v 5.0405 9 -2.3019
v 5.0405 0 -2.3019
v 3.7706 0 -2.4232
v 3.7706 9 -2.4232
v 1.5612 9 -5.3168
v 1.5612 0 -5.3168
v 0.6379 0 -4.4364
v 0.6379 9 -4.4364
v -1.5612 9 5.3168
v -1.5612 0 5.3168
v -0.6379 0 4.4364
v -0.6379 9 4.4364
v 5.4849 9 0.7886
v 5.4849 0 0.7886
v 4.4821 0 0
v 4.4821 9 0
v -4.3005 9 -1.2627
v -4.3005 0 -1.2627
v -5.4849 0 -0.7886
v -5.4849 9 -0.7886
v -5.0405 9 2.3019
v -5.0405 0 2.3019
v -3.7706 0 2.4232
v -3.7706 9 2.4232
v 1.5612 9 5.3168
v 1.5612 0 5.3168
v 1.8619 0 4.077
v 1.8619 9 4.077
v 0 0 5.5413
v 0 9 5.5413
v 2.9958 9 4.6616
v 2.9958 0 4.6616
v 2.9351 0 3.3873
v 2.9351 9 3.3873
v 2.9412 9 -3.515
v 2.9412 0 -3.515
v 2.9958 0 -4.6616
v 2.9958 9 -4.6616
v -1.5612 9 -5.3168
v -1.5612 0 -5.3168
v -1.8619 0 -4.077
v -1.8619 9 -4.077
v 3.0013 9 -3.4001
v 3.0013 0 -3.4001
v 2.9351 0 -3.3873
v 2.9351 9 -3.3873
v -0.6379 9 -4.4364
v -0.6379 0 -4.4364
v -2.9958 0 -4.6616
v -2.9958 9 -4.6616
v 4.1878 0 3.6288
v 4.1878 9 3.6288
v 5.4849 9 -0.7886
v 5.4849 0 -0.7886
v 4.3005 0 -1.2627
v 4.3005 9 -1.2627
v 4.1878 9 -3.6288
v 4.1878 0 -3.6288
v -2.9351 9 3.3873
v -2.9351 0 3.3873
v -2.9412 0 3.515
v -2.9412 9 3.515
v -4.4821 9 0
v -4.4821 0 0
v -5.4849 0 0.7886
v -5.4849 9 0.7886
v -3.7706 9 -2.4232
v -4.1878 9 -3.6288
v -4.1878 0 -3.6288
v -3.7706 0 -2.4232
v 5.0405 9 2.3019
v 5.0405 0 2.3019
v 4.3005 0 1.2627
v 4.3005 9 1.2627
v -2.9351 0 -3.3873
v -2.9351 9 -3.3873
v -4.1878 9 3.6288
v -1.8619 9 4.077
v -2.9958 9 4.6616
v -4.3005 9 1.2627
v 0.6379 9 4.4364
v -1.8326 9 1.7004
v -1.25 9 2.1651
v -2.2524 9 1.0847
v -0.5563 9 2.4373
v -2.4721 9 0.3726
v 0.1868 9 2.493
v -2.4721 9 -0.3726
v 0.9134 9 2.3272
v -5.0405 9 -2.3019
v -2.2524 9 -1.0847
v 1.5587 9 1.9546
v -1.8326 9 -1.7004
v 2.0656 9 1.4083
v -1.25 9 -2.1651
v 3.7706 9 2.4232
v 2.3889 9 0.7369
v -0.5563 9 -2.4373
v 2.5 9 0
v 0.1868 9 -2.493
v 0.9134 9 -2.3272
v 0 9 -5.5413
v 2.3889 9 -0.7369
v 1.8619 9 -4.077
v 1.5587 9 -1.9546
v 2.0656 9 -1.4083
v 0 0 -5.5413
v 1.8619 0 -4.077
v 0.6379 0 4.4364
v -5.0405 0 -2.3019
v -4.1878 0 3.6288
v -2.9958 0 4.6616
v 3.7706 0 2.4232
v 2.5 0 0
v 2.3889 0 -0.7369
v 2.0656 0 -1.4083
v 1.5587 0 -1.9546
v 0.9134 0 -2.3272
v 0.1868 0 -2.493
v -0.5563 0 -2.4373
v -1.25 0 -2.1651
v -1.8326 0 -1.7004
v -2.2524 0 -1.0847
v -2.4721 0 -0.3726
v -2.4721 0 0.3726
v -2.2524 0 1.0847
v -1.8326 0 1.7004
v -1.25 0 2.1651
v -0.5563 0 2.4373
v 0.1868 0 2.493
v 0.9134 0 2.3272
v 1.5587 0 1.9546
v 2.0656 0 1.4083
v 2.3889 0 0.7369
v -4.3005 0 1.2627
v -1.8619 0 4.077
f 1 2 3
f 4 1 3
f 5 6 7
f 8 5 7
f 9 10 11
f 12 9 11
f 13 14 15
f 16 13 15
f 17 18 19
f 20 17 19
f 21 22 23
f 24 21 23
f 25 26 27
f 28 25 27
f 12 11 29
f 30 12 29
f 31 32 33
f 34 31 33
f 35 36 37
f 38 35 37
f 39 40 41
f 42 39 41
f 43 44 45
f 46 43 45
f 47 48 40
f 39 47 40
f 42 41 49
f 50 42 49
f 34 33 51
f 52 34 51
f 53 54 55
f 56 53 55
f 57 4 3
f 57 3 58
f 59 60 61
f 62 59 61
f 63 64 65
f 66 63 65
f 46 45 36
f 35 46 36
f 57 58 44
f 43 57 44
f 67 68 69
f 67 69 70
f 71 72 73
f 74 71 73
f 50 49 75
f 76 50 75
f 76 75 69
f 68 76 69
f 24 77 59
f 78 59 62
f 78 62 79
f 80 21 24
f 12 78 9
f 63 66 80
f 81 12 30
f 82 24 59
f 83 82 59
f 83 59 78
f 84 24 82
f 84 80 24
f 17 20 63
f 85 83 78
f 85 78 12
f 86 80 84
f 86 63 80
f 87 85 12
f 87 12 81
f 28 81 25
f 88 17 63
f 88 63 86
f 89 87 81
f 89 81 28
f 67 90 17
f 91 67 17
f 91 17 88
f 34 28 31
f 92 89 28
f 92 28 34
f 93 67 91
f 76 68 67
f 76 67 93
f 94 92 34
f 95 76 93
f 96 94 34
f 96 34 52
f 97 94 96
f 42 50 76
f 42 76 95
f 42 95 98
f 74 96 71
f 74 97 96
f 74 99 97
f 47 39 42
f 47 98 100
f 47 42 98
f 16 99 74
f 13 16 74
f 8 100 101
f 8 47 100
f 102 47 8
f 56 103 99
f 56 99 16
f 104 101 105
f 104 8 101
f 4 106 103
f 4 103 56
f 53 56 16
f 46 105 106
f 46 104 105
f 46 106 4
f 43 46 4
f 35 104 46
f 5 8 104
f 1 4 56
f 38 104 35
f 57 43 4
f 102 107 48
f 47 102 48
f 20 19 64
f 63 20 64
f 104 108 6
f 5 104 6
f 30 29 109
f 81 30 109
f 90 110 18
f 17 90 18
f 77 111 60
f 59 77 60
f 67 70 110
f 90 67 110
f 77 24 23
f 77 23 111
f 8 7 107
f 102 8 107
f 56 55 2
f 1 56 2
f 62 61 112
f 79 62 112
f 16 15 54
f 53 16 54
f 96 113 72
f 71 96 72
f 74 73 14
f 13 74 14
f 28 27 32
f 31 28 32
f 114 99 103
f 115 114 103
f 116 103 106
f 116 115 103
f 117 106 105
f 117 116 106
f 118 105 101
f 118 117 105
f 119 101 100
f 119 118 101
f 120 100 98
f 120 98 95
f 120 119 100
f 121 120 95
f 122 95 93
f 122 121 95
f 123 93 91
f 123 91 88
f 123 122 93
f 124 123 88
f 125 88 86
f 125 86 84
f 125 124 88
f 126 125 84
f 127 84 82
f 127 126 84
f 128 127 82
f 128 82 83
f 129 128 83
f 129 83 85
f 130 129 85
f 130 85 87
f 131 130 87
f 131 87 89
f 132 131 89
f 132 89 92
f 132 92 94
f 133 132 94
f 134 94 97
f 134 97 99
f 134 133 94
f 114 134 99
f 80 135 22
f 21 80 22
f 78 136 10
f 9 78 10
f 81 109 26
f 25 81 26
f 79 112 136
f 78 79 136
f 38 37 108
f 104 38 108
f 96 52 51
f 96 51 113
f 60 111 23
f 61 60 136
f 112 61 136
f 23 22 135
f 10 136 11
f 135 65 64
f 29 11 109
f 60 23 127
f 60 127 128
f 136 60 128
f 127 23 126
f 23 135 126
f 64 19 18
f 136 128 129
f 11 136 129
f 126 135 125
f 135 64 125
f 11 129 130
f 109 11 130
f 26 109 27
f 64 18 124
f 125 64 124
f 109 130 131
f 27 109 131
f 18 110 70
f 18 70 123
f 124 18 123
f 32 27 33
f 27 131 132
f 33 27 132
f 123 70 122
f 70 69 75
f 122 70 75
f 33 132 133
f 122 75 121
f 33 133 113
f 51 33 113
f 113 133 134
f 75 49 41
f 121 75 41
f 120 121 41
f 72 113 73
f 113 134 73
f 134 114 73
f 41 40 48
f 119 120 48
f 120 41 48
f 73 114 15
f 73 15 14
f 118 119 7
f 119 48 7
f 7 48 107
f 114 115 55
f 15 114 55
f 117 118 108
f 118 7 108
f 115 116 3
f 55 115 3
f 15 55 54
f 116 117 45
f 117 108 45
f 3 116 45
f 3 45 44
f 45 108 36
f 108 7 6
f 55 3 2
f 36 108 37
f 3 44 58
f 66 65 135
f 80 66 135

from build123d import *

# Parameters (mm, degrees)
SKETCH1_R           = 2.5
BOSS_EXTRUDE1_DEPTH = 9


with BuildPart() as part:
    # Sketch1 → Boss-Extrude1 (new body)
    with BuildSketch(Plane(origin=(0, 0, 0), x_dir=(1, 0, 0), z_dir=(0, 1, 0))):
        Polygon((1.561153305, 5.316799887), (0.637864624, 4.436445909), (0, 5.541259846), (-0.637864624, 4.436445909), (-1.561153305, 5.316799887), (-1.861917874, 4.077031446), (-2.995831253, 4.661604422), (-2.935129611, 3.387320142), (-4.18780477, 3.62875349), (-3.770554603, 2.423188306), (-5.040507251, 2.301922531), (-4.300511685, 1.262744164), (-5.484857811, 0.788603499), (-4.482066887, 0), (-5.484857811, -0.788603499), (-4.300511685, -1.262744164), (-5.040507251, -2.301922531), (-3.770554603, -2.423188306), (-4.18780477, -3.62875349), (-2.935129611, -3.387320142), (-2.941213111, -3.515028519), (-2.995831253, -4.661604422), (-1.861917874, -4.077031446), (-1.561153305, -5.316799887), (-0.637864624, -4.436445909), (0, -5.541259846), (0.637864624, -4.436445909), (1.561153305, -5.316799887), (1.861917874, -4.077031446), (2.995831253, -4.661604422), (2.935129611, -3.387320142), (4.18780477, -3.62875349), (3.770554603, -2.423188306), (5.040507251, -2.301922531), (4.300511685, -1.262744164), (5.484857811, -0.788603499), (4.482066887, 0), (5.484857811, 0.788603499), (4.300511685, 1.262744164), (5.040507251, 2.301922531), (3.770554603, 2.423188306), (4.18780477, 3.62875349), (3.001290377, 3.400071585), (2.935129611, 3.387320142), (2.941213111, 3.515028519), (2.995831253, 4.661604422), (1.861917874, 4.077031446), align=None)
        Circle(SKETCH1_R, mode=Mode.SUBTRACT)
    extrude(amount=BOSS_EXTRUDE1_DEPTH)


solid = part.part
